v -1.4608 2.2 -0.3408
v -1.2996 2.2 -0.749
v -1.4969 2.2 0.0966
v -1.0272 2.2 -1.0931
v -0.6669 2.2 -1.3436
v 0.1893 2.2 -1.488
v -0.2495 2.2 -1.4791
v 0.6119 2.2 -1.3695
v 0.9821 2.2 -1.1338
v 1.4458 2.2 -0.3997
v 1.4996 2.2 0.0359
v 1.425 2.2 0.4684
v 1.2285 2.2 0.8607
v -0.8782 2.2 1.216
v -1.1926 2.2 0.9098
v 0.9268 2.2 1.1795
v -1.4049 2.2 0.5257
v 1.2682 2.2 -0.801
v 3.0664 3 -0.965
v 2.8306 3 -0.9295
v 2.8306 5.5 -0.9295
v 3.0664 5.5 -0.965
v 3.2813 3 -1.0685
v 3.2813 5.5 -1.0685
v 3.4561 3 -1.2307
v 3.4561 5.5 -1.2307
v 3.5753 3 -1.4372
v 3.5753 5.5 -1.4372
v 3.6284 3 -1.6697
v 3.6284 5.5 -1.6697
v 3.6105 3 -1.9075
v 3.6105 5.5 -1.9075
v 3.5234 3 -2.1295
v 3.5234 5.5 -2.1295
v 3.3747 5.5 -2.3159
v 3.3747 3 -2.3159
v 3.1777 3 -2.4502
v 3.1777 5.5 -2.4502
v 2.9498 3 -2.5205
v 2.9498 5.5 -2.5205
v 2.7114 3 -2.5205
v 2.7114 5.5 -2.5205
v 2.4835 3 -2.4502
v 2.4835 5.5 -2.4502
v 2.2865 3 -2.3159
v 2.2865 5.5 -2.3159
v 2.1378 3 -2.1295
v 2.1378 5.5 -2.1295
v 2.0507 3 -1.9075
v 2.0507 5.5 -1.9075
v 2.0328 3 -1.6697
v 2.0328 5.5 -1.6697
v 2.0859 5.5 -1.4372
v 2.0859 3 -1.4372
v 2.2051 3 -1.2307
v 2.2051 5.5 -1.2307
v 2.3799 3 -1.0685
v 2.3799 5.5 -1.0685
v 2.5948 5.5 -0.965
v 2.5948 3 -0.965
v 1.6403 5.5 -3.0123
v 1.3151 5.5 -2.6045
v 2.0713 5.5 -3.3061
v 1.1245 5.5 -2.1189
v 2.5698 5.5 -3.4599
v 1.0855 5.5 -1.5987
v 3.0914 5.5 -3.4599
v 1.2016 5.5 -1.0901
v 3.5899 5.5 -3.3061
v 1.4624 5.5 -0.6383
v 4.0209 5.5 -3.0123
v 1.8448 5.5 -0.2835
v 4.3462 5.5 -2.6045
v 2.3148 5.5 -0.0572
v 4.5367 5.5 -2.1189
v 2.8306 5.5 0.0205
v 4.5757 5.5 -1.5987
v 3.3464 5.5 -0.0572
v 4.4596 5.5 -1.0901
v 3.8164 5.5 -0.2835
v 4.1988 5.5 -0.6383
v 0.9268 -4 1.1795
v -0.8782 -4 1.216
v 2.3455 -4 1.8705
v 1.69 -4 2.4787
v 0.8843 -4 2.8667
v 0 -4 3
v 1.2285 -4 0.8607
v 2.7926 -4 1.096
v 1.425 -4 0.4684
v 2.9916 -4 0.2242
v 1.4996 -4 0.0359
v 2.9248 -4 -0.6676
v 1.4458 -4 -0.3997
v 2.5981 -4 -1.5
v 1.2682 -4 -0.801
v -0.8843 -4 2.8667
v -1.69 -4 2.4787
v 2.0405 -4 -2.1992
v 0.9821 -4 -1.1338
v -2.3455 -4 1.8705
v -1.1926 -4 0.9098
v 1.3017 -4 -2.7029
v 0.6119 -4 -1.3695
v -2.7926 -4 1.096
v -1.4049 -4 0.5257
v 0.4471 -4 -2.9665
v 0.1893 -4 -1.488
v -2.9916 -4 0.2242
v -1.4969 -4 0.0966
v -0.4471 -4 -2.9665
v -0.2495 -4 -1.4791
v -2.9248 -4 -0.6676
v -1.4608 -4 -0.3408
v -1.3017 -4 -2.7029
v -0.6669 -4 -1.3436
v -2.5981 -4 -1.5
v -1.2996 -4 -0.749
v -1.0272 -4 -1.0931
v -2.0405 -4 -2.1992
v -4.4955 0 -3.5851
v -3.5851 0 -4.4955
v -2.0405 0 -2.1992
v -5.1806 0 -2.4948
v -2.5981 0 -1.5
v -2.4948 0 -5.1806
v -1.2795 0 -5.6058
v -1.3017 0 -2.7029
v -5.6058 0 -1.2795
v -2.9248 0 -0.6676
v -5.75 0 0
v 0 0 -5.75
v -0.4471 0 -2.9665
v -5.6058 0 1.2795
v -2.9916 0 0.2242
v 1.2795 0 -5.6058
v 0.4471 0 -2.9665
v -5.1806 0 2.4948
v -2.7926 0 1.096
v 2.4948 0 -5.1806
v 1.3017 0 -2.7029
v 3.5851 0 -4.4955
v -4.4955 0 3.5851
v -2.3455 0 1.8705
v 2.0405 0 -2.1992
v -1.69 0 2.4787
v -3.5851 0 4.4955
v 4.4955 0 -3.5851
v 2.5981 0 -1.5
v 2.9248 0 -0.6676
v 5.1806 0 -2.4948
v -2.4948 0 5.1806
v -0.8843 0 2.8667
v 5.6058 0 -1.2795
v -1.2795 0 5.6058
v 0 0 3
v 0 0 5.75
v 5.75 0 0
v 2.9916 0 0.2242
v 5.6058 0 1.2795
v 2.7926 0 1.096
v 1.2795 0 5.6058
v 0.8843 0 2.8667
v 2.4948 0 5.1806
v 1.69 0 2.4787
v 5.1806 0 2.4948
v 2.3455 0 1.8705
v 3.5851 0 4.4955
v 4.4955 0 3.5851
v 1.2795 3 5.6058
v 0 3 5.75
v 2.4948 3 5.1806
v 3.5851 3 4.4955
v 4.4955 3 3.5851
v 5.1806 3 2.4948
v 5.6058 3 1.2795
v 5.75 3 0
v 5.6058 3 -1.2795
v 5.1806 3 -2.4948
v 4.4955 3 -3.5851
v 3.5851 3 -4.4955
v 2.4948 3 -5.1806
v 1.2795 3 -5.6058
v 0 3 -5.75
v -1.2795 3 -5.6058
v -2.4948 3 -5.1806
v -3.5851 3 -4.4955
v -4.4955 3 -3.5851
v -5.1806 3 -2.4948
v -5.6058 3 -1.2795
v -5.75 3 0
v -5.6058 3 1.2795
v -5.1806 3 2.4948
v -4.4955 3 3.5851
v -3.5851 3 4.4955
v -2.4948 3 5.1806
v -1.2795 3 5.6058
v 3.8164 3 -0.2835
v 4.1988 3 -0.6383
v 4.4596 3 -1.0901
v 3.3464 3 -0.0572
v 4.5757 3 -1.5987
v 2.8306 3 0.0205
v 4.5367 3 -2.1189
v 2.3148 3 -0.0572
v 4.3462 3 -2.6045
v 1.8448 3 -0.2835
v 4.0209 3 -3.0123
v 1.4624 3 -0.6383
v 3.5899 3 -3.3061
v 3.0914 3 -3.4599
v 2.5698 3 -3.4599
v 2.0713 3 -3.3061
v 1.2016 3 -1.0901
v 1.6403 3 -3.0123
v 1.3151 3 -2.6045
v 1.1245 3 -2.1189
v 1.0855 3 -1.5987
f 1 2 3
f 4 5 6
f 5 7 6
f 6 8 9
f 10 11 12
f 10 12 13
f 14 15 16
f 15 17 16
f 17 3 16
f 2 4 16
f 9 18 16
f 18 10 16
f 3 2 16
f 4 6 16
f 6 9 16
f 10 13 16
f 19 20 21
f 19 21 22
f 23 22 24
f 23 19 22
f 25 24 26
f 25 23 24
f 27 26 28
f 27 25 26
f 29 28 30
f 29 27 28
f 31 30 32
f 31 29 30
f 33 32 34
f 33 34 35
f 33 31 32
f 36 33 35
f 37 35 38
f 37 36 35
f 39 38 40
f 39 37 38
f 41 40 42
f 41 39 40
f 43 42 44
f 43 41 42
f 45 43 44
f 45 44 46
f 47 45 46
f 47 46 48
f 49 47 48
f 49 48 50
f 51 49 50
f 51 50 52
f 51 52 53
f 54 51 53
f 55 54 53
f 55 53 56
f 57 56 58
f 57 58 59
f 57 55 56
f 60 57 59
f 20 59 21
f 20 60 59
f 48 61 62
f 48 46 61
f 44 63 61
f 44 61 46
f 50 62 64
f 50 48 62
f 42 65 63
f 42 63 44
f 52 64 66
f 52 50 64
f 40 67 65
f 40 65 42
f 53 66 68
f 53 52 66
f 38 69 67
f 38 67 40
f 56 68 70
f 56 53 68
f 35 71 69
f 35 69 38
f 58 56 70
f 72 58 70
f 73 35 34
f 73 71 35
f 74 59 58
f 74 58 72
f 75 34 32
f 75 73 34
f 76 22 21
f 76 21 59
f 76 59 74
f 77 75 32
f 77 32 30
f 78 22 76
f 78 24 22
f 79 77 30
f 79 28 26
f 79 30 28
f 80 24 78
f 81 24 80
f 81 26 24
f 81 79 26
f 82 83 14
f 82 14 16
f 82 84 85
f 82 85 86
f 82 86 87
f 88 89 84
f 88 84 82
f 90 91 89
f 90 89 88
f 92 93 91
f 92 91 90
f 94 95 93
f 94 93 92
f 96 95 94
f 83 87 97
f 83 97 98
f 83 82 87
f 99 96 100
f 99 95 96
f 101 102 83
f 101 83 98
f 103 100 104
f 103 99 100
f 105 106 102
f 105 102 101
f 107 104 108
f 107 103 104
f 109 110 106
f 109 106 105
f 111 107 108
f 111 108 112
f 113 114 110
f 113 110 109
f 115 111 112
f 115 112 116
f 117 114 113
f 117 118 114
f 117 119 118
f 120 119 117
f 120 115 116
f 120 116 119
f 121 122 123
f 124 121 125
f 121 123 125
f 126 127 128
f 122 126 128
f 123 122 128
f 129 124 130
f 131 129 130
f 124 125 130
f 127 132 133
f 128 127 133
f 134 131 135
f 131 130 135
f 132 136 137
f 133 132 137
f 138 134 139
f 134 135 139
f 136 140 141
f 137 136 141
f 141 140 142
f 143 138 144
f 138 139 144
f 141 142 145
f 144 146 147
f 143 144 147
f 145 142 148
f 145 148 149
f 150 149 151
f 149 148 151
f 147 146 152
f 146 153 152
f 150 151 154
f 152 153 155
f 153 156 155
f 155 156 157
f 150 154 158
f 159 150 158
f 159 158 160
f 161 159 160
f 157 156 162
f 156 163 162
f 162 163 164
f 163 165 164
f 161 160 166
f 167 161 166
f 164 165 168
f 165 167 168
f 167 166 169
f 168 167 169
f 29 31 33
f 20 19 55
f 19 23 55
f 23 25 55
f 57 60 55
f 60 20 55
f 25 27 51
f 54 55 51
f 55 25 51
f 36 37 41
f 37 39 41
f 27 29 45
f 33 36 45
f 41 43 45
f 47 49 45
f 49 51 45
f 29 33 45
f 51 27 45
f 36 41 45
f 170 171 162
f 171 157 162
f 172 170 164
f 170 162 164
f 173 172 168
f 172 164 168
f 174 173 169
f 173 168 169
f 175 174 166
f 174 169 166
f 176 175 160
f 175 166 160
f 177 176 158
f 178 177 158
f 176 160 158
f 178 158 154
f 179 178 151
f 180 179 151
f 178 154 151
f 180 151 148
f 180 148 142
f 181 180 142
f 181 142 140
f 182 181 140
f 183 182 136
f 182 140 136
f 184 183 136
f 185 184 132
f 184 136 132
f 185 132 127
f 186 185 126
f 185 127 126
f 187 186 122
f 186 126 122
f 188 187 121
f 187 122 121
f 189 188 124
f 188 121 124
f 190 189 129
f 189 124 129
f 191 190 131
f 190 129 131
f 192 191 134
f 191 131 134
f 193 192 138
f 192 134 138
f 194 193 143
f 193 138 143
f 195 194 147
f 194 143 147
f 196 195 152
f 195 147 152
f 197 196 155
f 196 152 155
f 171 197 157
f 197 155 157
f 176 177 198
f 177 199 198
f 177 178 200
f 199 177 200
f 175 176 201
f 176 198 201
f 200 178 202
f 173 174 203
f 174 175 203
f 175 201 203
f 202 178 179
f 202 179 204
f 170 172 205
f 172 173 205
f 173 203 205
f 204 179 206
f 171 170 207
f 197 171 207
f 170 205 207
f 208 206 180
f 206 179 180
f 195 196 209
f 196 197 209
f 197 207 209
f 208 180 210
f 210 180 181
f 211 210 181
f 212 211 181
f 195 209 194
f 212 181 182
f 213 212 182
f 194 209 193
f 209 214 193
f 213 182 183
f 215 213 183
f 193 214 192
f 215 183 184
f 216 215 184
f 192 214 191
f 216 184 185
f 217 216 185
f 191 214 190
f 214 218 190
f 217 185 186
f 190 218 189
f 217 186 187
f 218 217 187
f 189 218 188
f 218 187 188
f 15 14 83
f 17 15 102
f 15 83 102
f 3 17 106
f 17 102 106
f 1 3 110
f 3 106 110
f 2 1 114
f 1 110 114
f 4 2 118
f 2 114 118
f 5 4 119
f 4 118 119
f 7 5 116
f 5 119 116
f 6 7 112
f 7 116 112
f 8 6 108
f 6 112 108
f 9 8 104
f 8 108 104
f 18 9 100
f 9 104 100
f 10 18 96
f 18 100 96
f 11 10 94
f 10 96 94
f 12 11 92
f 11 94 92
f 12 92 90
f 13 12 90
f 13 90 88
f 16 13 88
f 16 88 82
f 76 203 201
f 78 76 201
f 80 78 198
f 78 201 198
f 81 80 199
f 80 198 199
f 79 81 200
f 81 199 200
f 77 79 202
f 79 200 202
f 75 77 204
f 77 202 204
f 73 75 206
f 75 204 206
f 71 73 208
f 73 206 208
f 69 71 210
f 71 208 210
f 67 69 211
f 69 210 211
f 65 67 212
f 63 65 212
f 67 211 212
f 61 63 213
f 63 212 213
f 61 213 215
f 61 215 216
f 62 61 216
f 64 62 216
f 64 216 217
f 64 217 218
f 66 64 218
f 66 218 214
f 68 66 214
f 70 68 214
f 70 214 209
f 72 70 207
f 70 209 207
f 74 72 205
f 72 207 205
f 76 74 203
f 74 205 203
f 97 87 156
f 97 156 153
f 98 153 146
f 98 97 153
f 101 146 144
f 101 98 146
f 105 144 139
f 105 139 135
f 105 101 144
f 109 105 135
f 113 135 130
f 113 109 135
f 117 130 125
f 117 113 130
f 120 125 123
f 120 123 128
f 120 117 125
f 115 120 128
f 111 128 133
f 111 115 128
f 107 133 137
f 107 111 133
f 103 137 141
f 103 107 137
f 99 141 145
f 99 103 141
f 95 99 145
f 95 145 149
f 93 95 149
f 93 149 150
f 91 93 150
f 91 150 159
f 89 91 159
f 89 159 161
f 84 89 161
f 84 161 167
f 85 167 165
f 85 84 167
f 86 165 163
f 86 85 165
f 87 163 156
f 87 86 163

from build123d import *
from build123d.topology import SkipClean

# Parameters (mm, degrees)
SKETCH1_R           = 5.75
SKETCH1_R_2         = 1.5
BOSS_EXTRUDE1_DEPTH = 3
BOSS_EXTRUDE2_START = 4
SKETCH2_R           = 3
SKETCH2_R_2         = 1.5
BOSS_EXTRUDE2_DEPTH = 4
BOSS_EXTRUDE3_START = -7
BOSS_EXTRUDE3_DEPTH = 7
SKETCH4_R           = 1.75
SKETCH4_R_2         = 0.8
BOSS_EXTRUDE4_DEPTH = 2.5
BOSS_EXTRUDE5_START = -0.8
SKETCH5_R           = 5.75
BOSS_EXTRUDE5_DEPTH = 0.8


with BuildPart() as part:
    # Sketch1 → Boss-Extrude1 (new body)
    with BuildSketch(Plane(origin=(0, 0, 0), x_dir=(1, 0, 0), z_dir=(0, 1, 0))):
        with Locations(Location((0, 0, 0), (0, 0, 270))):
            Circle(SKETCH1_R)
        with Locations(Location((0, 0, 0), (0, 0, 270))):
            Circle(SKETCH1_R_2, mode=Mode.SUBTRACT)
    extrude(amount=BOSS_EXTRUDE1_DEPTH)

    # Sketch2 → Boss-Extrude2 (add)
    with SkipClean():  # the faces are left unmerged after this step: merging them gives an invalid solid
        with BuildSketch(Plane.XZ.offset(BOSS_EXTRUDE2_START)):
            with Locations(Location((0, 0, 0), (0, 0, 90))):
                Circle(SKETCH2_R)
            with Locations(Location((0, 0, 0), (0, 0, 270))):
                Circle(SKETCH2_R_2, mode=Mode.SUBTRACT)
        extrude(amount=-BOSS_EXTRUDE2_DEPTH)

    # Sketch3 → Boss-Extrude3 (add)
    with BuildSketch(Plane(origin=(0, 3, 0), x_dir=(1, 0, 0), z_dir=(0, 1, 0)).offset(BOSS_EXTRUDE3_START)):
        with BuildLine():
            Line((-0.878196328, -1.216047371), (0.926753921, -1.179460542))
            ThreePointArc((0.926753921, -1.179460542), (0.030399161, -1.499691932), (-0.878196328, -1.216047371))
        make_face()
    extrude(amount=BOSS_EXTRUDE3_DEPTH)

    # Sketch4 → Boss-Extrude4 (add)
    with BuildSketch(Plane(origin=(0, 3, 0), x_dir=(1, 0, 0), z_dir=(0, 1, 0))):
        with Locations(Location((2.83060587, 1.729454153, 0), (0, 0, 270))):
            Circle(SKETCH4_R)
        with Locations(Location((2.83060587, 1.729454153, 0), (0, 0, 270))):
            Circle(SKETCH4_R_2, mode=Mode.SUBTRACT)
    extrude(amount=BOSS_EXTRUDE4_DEPTH)

    # Sketch5 → Boss-Extrude5 (add)
    with BuildSketch(Plane(origin=(0, 3, 0), x_dir=(1, 0, 0), z_dir=(0, 1, 0)).offset(BOSS_EXTRUDE5_START)):
        with Locations(Location((0, 0, 0), (0, 0, 270))):
            Circle(SKETCH5_R)
    extrude(amount=BOSS_EXTRUDE5_DEPTH)


solid = part.part
